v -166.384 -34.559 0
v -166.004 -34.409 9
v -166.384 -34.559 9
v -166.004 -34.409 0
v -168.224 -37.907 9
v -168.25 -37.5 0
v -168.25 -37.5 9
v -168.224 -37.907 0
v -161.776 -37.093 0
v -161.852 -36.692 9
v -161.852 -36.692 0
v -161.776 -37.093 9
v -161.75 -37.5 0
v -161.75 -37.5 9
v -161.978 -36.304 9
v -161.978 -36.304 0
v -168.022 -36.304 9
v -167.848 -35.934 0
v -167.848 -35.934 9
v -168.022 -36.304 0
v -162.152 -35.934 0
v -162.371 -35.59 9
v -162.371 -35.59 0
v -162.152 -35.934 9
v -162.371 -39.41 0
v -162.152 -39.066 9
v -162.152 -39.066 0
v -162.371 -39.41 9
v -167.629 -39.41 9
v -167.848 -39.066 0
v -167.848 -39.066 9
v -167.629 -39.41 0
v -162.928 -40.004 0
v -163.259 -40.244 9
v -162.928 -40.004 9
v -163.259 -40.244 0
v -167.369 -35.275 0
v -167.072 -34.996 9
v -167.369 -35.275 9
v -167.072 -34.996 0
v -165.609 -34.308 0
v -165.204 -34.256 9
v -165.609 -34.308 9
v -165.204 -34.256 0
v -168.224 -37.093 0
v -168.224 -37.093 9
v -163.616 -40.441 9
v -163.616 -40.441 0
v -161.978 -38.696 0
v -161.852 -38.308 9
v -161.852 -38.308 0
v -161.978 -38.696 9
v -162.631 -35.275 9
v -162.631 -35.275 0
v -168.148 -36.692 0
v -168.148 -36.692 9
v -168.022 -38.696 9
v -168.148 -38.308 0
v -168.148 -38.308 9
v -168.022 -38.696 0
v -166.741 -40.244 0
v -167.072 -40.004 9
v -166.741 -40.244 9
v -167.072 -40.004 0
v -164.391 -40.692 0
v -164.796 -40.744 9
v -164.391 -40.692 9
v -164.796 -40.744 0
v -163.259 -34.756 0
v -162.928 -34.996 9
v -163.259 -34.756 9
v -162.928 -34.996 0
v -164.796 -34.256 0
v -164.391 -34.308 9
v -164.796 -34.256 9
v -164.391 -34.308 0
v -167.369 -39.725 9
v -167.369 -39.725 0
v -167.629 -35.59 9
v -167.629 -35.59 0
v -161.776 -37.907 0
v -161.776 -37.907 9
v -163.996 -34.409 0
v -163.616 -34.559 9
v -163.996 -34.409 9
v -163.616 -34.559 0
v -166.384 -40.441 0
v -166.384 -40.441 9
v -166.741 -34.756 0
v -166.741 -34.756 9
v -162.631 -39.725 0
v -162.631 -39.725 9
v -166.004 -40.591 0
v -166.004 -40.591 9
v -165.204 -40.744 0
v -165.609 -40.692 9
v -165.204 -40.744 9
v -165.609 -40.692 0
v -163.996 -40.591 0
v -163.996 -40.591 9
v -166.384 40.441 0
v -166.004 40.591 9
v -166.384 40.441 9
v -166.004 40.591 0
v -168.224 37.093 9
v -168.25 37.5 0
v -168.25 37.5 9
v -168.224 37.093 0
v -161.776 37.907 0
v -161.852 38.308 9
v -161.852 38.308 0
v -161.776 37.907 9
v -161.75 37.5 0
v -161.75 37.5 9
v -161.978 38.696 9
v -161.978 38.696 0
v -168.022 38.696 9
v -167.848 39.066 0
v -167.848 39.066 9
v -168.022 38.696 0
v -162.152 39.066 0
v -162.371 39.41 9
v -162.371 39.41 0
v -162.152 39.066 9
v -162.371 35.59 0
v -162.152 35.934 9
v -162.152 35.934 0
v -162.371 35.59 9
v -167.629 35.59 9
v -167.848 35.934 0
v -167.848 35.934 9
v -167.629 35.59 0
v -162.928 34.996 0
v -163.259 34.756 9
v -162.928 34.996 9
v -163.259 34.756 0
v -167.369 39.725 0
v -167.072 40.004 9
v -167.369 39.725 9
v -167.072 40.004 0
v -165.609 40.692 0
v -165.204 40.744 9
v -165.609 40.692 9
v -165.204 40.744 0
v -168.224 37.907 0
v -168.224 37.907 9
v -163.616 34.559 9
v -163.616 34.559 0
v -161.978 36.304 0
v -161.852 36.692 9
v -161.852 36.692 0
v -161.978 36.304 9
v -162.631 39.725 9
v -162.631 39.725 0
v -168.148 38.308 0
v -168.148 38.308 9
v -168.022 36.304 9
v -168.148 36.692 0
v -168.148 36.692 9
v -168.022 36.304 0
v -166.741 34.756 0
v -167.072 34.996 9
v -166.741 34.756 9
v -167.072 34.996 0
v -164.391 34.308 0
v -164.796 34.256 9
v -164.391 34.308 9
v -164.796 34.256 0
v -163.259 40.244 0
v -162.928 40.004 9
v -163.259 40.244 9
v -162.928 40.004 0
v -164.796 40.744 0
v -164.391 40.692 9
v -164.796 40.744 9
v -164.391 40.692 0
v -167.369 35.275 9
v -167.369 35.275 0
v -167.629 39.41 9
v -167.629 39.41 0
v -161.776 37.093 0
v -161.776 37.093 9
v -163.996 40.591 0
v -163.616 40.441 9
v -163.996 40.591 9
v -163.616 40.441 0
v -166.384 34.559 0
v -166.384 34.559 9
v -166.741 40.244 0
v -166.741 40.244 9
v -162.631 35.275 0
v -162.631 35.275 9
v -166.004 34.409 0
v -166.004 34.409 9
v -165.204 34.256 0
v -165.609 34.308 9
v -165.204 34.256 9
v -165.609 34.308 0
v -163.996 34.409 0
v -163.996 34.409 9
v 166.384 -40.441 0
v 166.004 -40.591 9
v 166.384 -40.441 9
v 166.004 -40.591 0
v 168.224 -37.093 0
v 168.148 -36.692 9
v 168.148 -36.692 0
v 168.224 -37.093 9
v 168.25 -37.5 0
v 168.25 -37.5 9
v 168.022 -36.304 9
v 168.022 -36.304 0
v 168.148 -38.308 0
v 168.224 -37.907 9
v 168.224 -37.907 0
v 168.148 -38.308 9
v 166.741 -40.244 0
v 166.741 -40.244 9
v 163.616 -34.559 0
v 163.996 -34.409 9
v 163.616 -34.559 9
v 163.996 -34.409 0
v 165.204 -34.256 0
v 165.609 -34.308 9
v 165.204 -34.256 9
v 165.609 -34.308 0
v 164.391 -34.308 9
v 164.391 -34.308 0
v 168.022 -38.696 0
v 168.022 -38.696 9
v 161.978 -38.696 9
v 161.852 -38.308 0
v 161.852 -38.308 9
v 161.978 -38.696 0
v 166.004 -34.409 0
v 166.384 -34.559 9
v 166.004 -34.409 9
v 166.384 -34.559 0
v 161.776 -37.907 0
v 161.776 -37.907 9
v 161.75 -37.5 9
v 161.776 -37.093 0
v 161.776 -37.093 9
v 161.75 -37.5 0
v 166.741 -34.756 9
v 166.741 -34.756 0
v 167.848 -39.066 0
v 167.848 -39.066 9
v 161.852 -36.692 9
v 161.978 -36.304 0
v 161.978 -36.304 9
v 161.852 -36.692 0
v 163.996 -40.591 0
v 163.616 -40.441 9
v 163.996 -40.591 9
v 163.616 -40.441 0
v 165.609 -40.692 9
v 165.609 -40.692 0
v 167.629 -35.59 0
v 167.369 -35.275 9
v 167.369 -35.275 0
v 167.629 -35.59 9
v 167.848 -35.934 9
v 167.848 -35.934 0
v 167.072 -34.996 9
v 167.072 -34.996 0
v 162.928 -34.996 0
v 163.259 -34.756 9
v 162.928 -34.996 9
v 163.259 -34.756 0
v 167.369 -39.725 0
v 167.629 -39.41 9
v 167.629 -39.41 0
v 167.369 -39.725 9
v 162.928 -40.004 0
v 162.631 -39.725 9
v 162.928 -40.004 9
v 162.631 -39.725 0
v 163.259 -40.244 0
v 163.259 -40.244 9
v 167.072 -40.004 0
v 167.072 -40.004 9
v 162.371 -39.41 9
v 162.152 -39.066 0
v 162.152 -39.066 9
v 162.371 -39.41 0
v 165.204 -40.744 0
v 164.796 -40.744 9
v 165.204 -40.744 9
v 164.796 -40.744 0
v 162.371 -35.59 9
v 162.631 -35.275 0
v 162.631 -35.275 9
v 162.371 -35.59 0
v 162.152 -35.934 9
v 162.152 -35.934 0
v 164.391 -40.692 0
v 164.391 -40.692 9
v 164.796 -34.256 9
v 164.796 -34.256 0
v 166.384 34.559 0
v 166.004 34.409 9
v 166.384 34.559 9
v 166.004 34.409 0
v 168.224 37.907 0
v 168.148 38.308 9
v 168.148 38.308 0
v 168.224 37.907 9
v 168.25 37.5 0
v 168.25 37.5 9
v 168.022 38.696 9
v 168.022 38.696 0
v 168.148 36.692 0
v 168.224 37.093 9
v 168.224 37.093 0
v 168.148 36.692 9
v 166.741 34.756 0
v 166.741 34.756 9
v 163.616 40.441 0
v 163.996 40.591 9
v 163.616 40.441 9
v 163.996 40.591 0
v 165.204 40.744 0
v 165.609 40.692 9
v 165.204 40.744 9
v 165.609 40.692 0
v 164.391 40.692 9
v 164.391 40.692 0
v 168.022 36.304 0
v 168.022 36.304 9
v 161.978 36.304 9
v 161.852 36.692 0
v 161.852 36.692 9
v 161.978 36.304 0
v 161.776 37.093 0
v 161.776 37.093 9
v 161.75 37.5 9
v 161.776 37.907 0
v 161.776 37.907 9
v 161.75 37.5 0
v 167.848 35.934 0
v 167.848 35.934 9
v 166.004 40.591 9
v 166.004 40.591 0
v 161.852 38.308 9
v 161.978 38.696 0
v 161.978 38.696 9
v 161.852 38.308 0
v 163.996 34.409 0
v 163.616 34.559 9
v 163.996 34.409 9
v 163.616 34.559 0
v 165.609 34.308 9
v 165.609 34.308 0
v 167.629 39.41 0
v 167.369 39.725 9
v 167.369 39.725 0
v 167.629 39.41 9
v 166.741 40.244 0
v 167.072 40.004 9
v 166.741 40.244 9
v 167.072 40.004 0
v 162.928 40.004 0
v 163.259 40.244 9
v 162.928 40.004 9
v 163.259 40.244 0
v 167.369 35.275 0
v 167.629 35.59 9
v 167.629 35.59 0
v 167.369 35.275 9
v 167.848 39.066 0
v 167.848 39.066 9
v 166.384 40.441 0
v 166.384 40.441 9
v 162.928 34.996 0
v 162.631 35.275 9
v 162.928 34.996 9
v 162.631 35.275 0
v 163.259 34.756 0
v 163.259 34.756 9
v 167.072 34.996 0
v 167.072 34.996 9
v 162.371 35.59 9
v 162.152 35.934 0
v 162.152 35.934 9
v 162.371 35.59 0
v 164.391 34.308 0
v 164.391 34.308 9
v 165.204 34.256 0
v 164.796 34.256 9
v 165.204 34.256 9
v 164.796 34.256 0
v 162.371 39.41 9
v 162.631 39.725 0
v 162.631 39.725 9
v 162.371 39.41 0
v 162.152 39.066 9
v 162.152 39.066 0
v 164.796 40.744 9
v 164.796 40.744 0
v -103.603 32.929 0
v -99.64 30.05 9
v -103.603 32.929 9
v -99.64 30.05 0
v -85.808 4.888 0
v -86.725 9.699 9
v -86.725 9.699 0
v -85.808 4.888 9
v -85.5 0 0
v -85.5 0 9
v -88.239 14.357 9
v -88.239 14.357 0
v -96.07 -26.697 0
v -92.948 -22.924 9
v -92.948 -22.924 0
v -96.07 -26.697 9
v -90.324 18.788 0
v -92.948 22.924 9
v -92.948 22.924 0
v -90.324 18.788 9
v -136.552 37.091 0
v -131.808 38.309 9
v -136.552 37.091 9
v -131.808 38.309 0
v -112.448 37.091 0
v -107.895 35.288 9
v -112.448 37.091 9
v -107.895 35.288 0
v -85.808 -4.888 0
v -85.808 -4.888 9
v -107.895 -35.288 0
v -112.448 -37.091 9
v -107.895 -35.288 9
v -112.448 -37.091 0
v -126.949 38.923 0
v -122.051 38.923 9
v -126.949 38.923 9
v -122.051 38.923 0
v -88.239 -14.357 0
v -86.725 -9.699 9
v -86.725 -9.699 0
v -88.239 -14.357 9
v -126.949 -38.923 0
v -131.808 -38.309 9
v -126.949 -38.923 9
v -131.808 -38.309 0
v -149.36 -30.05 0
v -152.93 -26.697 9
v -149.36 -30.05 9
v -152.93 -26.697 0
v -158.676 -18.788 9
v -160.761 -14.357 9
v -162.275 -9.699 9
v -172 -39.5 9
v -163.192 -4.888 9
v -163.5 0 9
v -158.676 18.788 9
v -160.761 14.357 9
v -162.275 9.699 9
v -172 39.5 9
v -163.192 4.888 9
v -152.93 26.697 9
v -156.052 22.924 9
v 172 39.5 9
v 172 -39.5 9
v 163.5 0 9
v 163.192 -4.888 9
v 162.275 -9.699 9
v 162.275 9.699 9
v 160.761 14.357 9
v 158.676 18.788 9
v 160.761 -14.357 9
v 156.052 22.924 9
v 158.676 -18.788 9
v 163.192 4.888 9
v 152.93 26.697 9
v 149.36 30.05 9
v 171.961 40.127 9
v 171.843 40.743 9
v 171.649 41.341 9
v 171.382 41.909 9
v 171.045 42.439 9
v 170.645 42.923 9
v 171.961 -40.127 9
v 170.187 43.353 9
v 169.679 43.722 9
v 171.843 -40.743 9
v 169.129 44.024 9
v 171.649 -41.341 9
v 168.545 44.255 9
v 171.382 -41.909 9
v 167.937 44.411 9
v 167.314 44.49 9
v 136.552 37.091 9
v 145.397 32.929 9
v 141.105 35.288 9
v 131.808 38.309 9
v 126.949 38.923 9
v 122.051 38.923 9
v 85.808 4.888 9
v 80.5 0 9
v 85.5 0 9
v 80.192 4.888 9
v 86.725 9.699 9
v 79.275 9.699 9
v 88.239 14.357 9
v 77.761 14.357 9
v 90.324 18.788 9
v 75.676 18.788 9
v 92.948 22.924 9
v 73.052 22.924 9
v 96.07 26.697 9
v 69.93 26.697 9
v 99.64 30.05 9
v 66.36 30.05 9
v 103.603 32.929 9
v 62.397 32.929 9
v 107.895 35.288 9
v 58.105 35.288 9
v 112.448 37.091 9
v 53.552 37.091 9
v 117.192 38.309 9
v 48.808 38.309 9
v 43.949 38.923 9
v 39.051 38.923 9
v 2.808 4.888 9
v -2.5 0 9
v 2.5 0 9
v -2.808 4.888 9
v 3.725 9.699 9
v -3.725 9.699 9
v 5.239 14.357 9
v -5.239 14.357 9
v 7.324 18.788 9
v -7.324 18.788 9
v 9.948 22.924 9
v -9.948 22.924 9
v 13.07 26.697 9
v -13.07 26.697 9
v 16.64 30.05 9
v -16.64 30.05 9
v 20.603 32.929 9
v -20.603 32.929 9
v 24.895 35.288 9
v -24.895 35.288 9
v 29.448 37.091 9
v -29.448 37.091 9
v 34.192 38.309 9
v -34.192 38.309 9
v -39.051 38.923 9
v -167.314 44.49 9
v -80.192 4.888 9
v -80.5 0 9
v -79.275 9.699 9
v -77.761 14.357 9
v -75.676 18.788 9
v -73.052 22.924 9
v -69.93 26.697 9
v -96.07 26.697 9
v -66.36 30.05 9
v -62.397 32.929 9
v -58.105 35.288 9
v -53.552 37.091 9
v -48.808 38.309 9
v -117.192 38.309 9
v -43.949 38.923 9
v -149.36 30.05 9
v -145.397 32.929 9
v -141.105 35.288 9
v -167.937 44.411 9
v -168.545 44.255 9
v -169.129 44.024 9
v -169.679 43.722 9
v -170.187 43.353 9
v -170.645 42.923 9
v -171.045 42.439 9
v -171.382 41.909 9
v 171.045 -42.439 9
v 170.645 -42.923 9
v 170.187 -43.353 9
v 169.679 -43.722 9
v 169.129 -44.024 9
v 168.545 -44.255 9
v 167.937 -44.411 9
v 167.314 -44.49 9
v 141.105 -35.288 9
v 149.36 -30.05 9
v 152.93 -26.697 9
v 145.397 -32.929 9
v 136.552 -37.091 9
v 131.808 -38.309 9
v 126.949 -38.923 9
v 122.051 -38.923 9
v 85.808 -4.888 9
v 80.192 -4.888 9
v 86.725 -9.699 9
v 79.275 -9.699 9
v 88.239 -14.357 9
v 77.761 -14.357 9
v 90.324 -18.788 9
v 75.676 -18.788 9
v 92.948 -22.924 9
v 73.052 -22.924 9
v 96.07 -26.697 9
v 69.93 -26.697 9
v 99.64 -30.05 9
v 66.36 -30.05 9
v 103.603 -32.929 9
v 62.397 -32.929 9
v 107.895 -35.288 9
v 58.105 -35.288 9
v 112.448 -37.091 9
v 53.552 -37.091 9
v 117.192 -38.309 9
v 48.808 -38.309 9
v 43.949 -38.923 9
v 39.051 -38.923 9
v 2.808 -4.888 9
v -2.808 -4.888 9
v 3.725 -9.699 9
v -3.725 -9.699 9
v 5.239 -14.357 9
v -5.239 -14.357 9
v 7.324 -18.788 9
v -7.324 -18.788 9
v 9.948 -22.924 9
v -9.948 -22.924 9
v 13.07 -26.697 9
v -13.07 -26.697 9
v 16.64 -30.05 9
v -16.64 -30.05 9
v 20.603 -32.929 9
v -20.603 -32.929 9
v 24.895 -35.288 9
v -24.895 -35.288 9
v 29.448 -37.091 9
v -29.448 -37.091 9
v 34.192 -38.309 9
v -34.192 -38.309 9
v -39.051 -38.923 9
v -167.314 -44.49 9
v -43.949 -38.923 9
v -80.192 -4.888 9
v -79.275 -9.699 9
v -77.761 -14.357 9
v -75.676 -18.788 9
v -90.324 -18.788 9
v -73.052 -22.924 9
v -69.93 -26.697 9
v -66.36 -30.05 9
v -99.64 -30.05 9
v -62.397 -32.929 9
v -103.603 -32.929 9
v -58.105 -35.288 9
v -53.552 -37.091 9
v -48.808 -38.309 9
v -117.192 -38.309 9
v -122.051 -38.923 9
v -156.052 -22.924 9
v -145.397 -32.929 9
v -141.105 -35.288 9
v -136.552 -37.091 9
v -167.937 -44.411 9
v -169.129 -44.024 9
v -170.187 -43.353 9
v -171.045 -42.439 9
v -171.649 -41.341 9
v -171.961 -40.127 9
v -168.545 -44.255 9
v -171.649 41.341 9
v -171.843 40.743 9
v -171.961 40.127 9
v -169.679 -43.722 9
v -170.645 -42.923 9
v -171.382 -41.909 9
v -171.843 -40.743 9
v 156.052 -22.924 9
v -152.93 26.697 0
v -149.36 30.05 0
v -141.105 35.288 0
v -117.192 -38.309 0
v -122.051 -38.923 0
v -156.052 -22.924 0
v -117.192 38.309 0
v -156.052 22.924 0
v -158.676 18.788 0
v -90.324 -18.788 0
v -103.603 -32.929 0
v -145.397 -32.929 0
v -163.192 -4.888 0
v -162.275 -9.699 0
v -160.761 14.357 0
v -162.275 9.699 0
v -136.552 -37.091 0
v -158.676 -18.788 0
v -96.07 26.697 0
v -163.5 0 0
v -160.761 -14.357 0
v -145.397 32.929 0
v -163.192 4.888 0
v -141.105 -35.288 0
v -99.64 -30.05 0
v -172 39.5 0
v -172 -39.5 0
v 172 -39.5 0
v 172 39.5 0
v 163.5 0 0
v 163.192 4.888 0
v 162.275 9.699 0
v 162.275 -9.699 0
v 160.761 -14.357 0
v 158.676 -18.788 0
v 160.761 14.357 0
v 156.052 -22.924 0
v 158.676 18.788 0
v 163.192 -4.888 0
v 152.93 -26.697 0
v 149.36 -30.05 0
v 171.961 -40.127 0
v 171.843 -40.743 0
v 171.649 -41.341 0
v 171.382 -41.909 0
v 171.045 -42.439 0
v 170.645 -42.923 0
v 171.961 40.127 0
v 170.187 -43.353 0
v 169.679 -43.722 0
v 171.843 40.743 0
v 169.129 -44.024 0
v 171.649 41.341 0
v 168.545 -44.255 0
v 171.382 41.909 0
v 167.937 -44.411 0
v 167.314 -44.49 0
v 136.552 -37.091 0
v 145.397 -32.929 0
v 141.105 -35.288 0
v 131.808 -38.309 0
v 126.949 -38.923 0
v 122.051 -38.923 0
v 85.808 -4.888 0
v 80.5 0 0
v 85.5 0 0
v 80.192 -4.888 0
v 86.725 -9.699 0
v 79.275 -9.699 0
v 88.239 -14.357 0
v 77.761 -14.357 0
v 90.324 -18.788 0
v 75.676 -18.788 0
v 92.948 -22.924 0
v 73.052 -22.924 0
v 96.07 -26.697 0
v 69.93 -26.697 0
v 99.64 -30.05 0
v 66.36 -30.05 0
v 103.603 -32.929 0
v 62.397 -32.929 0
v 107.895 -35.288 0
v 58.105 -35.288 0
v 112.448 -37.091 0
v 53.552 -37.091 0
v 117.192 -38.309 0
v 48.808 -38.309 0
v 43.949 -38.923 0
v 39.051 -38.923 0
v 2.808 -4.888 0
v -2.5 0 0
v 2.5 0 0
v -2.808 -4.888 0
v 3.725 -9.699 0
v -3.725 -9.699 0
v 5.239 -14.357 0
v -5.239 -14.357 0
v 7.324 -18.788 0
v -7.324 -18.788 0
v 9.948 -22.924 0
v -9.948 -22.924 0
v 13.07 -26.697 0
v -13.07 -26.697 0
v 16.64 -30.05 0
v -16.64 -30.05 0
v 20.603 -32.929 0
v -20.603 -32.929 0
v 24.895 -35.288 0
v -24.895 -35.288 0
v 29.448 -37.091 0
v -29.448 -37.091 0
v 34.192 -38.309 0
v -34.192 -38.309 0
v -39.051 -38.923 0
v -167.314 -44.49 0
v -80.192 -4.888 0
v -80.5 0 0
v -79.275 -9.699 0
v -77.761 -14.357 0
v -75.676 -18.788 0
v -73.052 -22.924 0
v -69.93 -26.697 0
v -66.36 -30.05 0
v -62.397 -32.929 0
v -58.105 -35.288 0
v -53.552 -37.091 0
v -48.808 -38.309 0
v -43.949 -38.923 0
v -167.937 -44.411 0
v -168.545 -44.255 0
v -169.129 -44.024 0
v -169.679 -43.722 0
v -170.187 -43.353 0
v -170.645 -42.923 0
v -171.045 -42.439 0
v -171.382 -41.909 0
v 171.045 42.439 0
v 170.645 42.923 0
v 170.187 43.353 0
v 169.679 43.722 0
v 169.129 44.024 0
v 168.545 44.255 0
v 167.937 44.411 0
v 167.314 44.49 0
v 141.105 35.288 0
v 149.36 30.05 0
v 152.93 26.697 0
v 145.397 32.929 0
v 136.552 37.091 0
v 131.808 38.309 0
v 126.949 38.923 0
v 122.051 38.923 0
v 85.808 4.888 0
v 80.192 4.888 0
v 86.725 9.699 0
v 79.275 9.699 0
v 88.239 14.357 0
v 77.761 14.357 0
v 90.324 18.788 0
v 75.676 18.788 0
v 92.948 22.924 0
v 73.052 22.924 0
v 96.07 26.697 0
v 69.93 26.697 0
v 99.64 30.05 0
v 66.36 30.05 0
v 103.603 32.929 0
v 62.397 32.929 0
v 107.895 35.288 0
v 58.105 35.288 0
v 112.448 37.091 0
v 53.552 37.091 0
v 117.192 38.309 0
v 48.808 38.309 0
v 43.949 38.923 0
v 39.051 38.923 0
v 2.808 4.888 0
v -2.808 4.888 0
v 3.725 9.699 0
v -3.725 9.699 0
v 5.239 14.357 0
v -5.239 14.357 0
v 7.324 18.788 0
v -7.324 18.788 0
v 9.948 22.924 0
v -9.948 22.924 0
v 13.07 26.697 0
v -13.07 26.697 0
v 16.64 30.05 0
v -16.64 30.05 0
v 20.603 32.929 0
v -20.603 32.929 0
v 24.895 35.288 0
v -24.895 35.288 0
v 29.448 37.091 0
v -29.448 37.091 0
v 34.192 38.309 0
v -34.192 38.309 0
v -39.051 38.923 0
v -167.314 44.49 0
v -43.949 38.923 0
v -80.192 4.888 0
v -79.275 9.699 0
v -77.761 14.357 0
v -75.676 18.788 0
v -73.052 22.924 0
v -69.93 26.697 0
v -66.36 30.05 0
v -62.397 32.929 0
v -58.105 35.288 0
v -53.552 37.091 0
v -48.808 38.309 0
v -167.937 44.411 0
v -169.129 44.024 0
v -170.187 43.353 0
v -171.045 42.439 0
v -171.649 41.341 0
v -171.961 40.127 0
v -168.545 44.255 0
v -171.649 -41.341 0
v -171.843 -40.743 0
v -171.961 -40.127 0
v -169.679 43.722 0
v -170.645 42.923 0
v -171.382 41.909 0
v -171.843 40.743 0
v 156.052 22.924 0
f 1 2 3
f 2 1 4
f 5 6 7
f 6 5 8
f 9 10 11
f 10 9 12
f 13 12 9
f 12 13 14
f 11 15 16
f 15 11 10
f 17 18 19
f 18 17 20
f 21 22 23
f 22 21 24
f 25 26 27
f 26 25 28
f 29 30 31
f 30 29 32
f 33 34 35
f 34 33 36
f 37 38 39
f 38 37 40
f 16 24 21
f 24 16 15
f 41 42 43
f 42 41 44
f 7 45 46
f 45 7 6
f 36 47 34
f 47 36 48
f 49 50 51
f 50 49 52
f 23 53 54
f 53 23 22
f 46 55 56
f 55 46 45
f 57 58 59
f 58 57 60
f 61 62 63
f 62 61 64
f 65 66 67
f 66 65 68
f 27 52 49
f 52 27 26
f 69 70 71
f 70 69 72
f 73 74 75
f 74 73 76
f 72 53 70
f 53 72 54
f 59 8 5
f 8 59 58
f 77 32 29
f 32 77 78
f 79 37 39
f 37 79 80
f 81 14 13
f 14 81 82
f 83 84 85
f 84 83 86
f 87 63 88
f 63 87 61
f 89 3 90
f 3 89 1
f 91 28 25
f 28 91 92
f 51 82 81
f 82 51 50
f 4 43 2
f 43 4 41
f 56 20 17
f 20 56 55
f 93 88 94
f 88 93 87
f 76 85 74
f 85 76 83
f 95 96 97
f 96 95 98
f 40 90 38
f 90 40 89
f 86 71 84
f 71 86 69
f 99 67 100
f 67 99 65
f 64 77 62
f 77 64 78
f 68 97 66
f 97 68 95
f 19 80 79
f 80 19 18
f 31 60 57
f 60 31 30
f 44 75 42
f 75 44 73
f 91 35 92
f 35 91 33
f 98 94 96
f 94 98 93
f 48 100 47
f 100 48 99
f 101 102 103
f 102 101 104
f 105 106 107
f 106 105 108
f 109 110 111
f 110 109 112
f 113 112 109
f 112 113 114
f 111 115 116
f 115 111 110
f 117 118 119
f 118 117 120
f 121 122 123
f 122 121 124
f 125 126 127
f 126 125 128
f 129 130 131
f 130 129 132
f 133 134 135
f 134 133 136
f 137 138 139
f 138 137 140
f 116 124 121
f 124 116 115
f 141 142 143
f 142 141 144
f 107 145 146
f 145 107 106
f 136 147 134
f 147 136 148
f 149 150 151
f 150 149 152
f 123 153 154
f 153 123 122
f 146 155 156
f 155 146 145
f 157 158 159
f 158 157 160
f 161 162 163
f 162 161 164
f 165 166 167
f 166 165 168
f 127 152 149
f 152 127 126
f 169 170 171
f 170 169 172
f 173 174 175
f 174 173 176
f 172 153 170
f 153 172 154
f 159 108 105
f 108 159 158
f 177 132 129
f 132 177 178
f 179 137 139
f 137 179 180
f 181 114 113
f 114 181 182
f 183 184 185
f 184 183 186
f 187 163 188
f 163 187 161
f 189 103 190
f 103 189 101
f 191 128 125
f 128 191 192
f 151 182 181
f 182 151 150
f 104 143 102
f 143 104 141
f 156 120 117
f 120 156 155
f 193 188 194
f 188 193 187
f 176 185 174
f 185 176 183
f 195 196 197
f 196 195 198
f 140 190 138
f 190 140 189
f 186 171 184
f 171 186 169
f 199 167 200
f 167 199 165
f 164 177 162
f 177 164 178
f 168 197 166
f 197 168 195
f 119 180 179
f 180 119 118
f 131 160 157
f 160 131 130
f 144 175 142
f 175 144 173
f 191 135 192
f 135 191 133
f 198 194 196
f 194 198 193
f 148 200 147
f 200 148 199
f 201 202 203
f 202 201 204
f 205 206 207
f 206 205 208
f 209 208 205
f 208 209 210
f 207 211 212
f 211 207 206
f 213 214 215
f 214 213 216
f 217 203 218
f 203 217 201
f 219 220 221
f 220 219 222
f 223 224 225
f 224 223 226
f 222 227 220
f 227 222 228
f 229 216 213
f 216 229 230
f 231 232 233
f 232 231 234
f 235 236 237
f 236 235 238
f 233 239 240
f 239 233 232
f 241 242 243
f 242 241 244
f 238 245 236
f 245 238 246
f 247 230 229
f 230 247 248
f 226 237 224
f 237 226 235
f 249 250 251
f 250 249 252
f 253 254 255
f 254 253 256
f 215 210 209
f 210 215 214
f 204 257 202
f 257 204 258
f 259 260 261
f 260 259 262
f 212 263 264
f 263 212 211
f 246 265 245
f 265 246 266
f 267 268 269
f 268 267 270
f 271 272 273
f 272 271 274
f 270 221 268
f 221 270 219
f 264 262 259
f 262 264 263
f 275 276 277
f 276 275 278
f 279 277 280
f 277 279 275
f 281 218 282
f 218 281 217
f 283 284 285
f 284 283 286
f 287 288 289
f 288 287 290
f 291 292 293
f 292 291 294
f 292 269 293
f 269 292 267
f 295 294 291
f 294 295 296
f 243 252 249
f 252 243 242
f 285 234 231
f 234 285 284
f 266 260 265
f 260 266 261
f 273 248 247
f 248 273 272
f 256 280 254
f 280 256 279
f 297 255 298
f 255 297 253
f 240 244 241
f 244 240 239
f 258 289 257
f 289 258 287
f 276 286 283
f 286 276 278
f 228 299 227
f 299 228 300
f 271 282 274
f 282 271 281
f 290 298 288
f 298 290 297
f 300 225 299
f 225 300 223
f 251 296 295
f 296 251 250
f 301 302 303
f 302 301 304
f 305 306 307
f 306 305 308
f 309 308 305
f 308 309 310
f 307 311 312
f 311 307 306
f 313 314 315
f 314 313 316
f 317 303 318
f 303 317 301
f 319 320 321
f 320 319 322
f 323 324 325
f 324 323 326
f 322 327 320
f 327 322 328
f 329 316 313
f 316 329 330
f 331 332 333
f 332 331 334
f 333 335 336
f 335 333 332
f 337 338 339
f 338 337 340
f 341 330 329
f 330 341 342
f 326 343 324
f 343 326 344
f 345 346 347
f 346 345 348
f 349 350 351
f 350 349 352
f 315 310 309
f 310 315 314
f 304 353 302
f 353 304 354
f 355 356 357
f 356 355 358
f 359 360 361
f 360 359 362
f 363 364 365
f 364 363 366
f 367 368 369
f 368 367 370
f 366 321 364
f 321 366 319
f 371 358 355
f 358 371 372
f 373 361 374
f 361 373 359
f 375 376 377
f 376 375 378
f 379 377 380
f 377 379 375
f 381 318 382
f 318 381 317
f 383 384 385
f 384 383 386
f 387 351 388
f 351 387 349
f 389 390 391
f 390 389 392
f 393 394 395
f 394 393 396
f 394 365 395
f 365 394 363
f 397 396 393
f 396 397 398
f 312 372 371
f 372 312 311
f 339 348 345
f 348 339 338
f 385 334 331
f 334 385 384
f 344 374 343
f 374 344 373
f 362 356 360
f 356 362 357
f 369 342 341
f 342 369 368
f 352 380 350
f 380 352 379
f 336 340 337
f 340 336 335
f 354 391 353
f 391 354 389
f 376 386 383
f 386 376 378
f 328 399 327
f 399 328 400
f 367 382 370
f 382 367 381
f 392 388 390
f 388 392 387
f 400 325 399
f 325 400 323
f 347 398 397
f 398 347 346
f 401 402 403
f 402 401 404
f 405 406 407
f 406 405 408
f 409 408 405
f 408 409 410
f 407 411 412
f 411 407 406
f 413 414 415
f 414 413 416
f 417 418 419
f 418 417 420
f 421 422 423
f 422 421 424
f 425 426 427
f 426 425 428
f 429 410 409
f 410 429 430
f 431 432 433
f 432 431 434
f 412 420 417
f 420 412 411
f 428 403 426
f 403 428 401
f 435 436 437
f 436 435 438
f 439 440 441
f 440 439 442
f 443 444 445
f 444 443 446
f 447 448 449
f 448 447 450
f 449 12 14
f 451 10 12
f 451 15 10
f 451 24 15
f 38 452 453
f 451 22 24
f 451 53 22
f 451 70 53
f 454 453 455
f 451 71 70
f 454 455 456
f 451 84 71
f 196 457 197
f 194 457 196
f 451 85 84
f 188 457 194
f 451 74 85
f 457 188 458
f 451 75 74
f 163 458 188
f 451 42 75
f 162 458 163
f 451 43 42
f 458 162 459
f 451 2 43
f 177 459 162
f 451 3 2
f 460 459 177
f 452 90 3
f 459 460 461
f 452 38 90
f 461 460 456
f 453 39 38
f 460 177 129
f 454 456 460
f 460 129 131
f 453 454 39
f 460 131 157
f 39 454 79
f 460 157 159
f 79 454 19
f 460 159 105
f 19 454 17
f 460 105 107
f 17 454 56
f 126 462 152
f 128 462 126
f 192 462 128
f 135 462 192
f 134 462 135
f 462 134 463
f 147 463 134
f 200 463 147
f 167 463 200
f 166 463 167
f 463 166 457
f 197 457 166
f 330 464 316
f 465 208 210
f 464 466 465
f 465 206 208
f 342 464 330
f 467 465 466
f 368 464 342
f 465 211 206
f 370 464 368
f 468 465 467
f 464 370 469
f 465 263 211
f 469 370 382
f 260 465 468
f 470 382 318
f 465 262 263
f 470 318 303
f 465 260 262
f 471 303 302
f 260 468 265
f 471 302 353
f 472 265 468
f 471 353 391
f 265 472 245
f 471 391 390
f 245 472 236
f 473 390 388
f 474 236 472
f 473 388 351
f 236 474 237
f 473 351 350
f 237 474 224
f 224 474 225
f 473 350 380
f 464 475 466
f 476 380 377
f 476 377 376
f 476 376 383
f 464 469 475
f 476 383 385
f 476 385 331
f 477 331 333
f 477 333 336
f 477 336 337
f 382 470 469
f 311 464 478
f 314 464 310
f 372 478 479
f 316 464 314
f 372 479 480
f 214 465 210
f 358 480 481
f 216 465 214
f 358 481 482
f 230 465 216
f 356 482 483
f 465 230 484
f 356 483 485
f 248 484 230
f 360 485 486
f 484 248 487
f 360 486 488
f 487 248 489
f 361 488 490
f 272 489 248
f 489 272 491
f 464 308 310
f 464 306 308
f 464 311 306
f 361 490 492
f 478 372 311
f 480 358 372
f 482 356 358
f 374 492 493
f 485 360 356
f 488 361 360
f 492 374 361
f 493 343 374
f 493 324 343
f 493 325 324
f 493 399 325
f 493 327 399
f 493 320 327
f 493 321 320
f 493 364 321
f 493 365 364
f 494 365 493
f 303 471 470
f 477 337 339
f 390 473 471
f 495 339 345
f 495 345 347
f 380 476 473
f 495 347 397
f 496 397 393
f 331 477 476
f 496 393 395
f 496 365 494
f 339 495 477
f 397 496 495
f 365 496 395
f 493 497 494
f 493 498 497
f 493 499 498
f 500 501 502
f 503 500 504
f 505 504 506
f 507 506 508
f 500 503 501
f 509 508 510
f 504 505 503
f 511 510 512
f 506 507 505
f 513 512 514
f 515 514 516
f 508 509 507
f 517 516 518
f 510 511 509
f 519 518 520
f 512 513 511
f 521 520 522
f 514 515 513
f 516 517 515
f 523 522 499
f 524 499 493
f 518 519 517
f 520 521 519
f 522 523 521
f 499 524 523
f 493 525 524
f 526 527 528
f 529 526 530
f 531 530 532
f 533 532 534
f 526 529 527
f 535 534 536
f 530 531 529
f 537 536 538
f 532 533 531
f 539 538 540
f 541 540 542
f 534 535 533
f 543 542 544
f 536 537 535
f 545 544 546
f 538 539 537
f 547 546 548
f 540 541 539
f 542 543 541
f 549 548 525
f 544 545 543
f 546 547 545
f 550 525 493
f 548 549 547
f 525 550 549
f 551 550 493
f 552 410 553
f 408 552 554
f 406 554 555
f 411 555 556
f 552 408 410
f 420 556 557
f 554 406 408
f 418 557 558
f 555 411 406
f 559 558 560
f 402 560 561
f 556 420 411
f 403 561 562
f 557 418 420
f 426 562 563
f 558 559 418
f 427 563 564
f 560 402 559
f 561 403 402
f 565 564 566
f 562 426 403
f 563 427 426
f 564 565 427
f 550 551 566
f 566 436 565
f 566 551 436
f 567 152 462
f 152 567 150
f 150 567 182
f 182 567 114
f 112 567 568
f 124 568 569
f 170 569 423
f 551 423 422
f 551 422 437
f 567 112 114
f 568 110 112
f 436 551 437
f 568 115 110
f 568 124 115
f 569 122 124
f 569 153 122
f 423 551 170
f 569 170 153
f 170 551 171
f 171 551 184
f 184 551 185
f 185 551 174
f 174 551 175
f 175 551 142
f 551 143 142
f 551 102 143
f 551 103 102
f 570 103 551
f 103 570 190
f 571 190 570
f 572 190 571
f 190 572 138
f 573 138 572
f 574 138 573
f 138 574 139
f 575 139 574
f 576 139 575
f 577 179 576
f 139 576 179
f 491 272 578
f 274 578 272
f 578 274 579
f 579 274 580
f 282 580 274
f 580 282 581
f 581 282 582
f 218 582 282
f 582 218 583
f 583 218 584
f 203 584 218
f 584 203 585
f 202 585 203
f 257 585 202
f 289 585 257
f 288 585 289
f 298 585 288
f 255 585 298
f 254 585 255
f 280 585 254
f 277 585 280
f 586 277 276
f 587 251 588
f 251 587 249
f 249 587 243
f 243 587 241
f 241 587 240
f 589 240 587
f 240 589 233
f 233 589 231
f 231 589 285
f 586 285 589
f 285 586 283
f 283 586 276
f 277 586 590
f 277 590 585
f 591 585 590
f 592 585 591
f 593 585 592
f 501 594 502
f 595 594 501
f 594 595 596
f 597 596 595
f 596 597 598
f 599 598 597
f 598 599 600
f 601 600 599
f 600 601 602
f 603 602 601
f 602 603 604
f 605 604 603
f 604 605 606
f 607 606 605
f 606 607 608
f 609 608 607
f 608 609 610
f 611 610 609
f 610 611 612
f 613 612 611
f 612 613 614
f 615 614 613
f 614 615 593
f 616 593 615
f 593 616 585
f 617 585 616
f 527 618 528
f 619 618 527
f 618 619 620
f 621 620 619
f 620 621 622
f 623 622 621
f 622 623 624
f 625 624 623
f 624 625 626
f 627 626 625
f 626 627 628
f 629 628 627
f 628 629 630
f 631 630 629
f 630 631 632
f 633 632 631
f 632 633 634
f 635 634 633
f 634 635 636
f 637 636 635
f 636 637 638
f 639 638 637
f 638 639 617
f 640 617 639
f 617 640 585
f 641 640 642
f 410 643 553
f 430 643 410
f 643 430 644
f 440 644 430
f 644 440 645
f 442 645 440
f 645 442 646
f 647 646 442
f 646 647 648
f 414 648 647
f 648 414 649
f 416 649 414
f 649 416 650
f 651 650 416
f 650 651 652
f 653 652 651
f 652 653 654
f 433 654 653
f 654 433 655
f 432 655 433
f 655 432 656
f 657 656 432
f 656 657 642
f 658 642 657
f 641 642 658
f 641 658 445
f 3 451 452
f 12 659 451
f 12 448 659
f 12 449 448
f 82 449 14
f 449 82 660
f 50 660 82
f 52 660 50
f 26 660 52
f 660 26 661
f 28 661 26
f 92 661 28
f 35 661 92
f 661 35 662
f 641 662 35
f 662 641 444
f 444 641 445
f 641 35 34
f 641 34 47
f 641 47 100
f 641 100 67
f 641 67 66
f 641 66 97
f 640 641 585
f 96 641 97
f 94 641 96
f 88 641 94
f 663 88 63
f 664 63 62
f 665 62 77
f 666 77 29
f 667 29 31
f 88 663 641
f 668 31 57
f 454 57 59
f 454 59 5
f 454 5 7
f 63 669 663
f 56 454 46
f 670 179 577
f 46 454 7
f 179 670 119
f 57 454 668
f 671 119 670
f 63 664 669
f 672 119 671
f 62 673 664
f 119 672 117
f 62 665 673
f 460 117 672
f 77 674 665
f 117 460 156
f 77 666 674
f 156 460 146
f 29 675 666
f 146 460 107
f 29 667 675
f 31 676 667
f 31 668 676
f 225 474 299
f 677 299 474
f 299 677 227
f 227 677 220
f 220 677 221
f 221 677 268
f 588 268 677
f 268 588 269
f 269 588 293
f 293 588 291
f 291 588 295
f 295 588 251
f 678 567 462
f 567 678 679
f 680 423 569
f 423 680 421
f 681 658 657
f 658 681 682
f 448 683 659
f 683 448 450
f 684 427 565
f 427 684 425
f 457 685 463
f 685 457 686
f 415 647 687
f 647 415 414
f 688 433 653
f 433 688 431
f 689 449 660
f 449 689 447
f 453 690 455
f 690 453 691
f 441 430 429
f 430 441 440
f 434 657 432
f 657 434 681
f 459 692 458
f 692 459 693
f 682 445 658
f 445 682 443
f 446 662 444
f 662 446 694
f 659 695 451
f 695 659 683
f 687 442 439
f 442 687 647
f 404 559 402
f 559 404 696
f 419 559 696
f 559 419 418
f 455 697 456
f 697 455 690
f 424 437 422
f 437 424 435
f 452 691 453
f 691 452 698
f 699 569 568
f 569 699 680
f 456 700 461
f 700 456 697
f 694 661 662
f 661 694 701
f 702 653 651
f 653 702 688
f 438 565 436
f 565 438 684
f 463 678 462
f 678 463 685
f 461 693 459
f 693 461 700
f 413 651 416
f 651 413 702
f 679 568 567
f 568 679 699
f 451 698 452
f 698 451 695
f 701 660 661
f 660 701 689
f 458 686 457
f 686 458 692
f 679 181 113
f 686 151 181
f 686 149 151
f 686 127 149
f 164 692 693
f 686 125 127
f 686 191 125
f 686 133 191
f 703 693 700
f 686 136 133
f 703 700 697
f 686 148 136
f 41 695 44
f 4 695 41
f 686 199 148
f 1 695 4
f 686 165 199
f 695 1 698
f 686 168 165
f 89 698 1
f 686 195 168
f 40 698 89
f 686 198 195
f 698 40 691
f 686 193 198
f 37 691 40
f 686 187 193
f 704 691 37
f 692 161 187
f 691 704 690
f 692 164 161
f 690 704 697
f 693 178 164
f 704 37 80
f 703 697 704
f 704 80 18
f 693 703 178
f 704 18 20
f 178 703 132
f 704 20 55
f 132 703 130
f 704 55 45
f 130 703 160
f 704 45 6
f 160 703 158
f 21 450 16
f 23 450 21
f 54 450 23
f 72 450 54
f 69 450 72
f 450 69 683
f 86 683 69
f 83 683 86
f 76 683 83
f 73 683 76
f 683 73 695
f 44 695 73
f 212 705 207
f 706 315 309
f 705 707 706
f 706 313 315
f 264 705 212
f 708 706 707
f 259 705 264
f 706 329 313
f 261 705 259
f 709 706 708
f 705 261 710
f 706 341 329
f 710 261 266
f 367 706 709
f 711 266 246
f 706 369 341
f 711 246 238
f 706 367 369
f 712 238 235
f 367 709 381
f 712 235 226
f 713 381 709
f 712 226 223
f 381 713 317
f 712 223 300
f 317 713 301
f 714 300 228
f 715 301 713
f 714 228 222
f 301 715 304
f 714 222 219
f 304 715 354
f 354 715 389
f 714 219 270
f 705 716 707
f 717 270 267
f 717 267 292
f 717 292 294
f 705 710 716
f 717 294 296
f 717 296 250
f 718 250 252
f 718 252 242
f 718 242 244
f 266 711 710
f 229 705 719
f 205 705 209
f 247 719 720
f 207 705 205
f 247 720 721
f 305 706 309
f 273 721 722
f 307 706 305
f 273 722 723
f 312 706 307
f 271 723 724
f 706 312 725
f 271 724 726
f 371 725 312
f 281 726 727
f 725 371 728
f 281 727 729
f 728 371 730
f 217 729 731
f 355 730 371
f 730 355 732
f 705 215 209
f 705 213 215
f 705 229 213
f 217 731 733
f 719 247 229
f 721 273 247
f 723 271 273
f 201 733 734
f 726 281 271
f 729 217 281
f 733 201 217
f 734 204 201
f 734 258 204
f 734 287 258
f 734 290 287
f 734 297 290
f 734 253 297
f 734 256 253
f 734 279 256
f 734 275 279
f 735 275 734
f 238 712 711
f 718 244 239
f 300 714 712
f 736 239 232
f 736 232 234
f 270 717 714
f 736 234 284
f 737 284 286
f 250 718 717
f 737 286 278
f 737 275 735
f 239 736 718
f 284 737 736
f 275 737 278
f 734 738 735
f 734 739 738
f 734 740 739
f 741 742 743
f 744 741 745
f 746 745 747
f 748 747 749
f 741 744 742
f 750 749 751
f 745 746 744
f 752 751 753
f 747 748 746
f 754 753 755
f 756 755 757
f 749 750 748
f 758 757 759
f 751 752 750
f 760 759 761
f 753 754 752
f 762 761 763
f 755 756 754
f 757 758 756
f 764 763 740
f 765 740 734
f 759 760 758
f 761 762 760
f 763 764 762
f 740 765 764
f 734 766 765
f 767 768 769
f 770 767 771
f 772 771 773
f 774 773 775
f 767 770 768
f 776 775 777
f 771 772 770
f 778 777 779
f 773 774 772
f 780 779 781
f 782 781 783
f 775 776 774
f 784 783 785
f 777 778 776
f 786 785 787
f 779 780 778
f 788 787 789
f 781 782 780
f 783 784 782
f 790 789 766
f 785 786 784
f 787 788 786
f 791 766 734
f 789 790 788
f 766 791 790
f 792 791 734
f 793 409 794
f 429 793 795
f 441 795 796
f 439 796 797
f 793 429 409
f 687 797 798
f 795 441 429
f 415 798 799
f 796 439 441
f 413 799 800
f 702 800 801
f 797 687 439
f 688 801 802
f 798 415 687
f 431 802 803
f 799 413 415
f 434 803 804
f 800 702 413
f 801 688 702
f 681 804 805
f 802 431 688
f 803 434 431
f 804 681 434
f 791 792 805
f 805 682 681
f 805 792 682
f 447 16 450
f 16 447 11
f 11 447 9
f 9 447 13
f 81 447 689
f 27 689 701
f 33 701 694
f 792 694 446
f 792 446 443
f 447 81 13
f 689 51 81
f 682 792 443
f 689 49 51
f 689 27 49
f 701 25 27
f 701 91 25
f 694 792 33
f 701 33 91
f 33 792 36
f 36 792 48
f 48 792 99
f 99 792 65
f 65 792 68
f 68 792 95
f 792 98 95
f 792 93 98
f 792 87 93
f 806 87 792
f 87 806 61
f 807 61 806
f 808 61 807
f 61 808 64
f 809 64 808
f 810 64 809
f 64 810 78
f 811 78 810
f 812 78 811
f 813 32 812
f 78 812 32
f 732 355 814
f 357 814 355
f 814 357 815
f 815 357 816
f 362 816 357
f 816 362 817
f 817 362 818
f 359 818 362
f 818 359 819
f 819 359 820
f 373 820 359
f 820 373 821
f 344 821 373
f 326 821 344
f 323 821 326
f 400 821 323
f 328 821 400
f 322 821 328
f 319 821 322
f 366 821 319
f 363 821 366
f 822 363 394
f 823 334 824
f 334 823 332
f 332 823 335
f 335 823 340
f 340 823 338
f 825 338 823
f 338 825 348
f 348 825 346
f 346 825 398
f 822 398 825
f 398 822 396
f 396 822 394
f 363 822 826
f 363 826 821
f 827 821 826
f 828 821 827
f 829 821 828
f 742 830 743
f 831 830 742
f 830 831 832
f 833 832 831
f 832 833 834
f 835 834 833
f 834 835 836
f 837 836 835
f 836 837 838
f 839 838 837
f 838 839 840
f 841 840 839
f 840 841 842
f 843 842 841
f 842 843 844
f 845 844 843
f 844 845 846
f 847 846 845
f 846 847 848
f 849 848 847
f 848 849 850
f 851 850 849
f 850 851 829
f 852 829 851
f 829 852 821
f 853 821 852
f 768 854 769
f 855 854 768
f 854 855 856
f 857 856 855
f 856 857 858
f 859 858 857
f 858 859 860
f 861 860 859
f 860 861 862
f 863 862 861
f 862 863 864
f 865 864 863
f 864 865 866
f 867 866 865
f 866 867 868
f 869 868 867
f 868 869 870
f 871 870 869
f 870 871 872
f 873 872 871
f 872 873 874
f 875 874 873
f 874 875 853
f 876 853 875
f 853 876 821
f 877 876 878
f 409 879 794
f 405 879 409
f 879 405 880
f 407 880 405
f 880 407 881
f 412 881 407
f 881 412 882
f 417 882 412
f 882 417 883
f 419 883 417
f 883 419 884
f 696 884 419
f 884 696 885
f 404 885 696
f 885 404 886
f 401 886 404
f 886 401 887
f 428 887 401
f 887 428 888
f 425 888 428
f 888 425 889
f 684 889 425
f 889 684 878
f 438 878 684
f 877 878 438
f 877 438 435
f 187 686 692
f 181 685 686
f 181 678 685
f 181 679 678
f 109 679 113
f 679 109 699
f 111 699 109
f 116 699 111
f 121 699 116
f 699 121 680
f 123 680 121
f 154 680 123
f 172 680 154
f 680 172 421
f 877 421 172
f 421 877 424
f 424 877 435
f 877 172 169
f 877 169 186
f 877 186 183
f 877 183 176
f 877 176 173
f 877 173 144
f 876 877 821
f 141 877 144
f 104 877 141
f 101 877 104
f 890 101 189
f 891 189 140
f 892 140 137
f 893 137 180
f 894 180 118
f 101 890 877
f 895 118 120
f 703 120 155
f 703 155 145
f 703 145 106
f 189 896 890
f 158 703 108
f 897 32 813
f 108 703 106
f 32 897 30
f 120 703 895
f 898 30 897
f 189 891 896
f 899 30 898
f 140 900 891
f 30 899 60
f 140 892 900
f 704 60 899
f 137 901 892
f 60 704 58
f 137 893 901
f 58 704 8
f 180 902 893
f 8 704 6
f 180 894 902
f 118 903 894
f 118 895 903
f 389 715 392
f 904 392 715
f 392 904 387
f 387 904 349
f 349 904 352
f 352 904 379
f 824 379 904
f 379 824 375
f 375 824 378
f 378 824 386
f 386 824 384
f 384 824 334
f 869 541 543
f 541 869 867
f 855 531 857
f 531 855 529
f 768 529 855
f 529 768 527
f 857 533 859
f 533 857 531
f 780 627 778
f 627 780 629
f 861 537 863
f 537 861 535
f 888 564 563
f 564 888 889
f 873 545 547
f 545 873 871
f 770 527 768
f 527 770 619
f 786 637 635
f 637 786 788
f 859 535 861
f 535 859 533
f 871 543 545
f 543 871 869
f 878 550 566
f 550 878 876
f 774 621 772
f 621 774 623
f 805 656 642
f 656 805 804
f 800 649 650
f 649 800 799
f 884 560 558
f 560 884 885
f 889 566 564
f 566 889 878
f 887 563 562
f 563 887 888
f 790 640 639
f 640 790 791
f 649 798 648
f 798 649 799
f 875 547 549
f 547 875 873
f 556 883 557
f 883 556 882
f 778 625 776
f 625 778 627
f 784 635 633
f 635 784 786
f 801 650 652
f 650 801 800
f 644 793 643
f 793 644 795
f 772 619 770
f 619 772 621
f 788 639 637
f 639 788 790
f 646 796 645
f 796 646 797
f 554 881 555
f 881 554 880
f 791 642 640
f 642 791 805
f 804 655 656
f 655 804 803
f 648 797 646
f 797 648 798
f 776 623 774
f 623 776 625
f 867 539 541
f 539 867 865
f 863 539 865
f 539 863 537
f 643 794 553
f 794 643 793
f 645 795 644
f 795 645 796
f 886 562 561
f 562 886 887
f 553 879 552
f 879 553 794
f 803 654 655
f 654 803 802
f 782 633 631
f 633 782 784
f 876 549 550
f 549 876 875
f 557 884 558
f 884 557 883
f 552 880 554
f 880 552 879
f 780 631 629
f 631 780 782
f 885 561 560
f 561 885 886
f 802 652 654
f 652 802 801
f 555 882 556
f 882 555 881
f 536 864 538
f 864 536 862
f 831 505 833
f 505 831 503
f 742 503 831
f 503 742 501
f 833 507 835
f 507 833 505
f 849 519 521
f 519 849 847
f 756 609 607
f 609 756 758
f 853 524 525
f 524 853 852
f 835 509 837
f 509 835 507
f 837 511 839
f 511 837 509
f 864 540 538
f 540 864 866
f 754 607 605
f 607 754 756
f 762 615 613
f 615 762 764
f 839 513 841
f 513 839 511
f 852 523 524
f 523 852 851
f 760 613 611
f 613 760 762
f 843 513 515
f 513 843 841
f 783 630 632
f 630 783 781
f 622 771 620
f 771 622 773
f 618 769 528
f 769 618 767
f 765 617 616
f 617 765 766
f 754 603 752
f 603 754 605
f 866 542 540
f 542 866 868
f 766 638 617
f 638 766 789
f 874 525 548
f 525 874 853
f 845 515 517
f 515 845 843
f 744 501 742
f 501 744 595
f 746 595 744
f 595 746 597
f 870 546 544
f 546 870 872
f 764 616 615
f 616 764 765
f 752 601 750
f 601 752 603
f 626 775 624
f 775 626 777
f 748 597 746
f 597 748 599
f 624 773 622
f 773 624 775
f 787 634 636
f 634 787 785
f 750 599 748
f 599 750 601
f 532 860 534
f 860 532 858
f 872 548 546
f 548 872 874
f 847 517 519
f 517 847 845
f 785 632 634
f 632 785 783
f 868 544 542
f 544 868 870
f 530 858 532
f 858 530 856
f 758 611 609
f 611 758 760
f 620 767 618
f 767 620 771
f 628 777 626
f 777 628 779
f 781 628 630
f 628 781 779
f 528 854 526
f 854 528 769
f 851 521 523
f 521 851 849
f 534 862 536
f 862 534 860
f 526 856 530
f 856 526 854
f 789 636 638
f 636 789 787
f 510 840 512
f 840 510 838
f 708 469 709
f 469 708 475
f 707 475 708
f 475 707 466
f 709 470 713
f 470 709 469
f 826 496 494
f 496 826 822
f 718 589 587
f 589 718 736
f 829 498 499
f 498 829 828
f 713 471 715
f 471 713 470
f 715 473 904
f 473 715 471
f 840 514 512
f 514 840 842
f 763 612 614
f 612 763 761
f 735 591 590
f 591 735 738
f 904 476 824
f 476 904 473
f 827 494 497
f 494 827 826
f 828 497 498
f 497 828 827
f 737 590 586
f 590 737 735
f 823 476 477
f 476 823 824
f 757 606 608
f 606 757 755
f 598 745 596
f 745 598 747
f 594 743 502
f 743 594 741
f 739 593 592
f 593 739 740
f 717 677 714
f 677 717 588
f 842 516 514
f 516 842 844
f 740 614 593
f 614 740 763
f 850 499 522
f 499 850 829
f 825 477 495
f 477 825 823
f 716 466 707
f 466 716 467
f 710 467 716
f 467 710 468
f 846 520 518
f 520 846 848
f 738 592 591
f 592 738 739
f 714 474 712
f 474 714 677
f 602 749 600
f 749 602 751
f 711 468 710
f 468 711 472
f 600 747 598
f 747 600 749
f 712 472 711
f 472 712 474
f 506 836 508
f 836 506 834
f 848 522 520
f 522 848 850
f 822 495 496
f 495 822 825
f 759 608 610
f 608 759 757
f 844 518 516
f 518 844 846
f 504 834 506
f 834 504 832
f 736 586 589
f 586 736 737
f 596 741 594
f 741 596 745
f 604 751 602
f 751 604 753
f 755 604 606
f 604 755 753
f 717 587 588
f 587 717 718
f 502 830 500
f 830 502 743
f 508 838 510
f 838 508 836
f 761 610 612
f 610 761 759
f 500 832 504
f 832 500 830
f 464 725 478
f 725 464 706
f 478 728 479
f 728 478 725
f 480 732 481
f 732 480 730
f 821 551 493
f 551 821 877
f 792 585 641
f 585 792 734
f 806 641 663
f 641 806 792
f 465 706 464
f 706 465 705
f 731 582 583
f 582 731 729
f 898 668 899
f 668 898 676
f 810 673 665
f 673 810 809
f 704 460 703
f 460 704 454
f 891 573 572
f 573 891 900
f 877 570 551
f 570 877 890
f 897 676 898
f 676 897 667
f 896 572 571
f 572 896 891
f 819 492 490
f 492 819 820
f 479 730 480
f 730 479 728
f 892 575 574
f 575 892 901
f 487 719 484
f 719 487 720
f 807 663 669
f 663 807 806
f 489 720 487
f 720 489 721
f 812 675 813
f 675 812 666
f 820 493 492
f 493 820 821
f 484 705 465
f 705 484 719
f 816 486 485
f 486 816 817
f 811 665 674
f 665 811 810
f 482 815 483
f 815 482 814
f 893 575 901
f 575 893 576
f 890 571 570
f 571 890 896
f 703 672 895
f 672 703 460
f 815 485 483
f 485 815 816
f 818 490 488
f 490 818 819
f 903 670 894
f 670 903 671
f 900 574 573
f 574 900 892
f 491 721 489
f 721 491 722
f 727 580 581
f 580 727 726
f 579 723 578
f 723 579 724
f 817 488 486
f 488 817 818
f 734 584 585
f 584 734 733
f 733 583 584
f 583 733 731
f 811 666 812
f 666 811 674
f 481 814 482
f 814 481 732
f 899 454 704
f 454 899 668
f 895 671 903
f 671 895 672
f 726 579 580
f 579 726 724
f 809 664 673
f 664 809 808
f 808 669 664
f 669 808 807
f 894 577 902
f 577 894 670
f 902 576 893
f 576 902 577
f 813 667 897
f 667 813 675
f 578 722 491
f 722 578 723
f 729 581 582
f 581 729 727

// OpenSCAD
$fn = 50;


difference() {
	union() {
		hull() {
			translate(v = [-167.0000000000, 39.5000000000, 0]) {
				cylinder(h = 9, r = 5);
			}
			translate(v = [167.0000000000, 39.5000000000, 0]) {
				cylinder(h = 9, r = 5);
			}
			translate(v = [-167.0000000000, -39.5000000000, 0]) {
				cylinder(h = 9, r = 5);
			}
			translate(v = [167.0000000000, -39.5000000000, 0]) {
				cylinder(h = 9, r = 5);
			}
		}
	}
	union() {
		#translate(v = [-165.0000000000, -37.5000000000, -100.0000000000]) {
			cylinder(h = 200, r = 3.2500000000);
		}
		#translate(v = [-165.0000000000, 37.5000000000, -100.0000000000]) {
			cylinder(h = 200, r = 3.2500000000);
		}
		#translate(v = [165.0000000000, -37.5000000000, -100.0000000000]) {
			cylinder(h = 200, r = 3.2500000000);
		}
		#translate(v = [165.0000000000, 37.5000000000, -100.0000000000]) {
			cylinder(h = 200, r = 3.2500000000);
		}
		#translate(v = [-124.5000000000, 0, 0]) {
			cylinder(h = 9, r = 39.0000000000);
		}
		#translate(v = [-41.5000000000, 0, 0]) {
			cylinder(h = 9, r = 39.0000000000);
		}
		#translate(v = [41.5000000000, 0, 0]) {
			cylinder(h = 9, r = 39.0000000000);
		}
		#translate(v = [124.5000000000, 0, 0]) {
			cylinder(h = 9, r = 39.0000000000);
		}
	}
}
